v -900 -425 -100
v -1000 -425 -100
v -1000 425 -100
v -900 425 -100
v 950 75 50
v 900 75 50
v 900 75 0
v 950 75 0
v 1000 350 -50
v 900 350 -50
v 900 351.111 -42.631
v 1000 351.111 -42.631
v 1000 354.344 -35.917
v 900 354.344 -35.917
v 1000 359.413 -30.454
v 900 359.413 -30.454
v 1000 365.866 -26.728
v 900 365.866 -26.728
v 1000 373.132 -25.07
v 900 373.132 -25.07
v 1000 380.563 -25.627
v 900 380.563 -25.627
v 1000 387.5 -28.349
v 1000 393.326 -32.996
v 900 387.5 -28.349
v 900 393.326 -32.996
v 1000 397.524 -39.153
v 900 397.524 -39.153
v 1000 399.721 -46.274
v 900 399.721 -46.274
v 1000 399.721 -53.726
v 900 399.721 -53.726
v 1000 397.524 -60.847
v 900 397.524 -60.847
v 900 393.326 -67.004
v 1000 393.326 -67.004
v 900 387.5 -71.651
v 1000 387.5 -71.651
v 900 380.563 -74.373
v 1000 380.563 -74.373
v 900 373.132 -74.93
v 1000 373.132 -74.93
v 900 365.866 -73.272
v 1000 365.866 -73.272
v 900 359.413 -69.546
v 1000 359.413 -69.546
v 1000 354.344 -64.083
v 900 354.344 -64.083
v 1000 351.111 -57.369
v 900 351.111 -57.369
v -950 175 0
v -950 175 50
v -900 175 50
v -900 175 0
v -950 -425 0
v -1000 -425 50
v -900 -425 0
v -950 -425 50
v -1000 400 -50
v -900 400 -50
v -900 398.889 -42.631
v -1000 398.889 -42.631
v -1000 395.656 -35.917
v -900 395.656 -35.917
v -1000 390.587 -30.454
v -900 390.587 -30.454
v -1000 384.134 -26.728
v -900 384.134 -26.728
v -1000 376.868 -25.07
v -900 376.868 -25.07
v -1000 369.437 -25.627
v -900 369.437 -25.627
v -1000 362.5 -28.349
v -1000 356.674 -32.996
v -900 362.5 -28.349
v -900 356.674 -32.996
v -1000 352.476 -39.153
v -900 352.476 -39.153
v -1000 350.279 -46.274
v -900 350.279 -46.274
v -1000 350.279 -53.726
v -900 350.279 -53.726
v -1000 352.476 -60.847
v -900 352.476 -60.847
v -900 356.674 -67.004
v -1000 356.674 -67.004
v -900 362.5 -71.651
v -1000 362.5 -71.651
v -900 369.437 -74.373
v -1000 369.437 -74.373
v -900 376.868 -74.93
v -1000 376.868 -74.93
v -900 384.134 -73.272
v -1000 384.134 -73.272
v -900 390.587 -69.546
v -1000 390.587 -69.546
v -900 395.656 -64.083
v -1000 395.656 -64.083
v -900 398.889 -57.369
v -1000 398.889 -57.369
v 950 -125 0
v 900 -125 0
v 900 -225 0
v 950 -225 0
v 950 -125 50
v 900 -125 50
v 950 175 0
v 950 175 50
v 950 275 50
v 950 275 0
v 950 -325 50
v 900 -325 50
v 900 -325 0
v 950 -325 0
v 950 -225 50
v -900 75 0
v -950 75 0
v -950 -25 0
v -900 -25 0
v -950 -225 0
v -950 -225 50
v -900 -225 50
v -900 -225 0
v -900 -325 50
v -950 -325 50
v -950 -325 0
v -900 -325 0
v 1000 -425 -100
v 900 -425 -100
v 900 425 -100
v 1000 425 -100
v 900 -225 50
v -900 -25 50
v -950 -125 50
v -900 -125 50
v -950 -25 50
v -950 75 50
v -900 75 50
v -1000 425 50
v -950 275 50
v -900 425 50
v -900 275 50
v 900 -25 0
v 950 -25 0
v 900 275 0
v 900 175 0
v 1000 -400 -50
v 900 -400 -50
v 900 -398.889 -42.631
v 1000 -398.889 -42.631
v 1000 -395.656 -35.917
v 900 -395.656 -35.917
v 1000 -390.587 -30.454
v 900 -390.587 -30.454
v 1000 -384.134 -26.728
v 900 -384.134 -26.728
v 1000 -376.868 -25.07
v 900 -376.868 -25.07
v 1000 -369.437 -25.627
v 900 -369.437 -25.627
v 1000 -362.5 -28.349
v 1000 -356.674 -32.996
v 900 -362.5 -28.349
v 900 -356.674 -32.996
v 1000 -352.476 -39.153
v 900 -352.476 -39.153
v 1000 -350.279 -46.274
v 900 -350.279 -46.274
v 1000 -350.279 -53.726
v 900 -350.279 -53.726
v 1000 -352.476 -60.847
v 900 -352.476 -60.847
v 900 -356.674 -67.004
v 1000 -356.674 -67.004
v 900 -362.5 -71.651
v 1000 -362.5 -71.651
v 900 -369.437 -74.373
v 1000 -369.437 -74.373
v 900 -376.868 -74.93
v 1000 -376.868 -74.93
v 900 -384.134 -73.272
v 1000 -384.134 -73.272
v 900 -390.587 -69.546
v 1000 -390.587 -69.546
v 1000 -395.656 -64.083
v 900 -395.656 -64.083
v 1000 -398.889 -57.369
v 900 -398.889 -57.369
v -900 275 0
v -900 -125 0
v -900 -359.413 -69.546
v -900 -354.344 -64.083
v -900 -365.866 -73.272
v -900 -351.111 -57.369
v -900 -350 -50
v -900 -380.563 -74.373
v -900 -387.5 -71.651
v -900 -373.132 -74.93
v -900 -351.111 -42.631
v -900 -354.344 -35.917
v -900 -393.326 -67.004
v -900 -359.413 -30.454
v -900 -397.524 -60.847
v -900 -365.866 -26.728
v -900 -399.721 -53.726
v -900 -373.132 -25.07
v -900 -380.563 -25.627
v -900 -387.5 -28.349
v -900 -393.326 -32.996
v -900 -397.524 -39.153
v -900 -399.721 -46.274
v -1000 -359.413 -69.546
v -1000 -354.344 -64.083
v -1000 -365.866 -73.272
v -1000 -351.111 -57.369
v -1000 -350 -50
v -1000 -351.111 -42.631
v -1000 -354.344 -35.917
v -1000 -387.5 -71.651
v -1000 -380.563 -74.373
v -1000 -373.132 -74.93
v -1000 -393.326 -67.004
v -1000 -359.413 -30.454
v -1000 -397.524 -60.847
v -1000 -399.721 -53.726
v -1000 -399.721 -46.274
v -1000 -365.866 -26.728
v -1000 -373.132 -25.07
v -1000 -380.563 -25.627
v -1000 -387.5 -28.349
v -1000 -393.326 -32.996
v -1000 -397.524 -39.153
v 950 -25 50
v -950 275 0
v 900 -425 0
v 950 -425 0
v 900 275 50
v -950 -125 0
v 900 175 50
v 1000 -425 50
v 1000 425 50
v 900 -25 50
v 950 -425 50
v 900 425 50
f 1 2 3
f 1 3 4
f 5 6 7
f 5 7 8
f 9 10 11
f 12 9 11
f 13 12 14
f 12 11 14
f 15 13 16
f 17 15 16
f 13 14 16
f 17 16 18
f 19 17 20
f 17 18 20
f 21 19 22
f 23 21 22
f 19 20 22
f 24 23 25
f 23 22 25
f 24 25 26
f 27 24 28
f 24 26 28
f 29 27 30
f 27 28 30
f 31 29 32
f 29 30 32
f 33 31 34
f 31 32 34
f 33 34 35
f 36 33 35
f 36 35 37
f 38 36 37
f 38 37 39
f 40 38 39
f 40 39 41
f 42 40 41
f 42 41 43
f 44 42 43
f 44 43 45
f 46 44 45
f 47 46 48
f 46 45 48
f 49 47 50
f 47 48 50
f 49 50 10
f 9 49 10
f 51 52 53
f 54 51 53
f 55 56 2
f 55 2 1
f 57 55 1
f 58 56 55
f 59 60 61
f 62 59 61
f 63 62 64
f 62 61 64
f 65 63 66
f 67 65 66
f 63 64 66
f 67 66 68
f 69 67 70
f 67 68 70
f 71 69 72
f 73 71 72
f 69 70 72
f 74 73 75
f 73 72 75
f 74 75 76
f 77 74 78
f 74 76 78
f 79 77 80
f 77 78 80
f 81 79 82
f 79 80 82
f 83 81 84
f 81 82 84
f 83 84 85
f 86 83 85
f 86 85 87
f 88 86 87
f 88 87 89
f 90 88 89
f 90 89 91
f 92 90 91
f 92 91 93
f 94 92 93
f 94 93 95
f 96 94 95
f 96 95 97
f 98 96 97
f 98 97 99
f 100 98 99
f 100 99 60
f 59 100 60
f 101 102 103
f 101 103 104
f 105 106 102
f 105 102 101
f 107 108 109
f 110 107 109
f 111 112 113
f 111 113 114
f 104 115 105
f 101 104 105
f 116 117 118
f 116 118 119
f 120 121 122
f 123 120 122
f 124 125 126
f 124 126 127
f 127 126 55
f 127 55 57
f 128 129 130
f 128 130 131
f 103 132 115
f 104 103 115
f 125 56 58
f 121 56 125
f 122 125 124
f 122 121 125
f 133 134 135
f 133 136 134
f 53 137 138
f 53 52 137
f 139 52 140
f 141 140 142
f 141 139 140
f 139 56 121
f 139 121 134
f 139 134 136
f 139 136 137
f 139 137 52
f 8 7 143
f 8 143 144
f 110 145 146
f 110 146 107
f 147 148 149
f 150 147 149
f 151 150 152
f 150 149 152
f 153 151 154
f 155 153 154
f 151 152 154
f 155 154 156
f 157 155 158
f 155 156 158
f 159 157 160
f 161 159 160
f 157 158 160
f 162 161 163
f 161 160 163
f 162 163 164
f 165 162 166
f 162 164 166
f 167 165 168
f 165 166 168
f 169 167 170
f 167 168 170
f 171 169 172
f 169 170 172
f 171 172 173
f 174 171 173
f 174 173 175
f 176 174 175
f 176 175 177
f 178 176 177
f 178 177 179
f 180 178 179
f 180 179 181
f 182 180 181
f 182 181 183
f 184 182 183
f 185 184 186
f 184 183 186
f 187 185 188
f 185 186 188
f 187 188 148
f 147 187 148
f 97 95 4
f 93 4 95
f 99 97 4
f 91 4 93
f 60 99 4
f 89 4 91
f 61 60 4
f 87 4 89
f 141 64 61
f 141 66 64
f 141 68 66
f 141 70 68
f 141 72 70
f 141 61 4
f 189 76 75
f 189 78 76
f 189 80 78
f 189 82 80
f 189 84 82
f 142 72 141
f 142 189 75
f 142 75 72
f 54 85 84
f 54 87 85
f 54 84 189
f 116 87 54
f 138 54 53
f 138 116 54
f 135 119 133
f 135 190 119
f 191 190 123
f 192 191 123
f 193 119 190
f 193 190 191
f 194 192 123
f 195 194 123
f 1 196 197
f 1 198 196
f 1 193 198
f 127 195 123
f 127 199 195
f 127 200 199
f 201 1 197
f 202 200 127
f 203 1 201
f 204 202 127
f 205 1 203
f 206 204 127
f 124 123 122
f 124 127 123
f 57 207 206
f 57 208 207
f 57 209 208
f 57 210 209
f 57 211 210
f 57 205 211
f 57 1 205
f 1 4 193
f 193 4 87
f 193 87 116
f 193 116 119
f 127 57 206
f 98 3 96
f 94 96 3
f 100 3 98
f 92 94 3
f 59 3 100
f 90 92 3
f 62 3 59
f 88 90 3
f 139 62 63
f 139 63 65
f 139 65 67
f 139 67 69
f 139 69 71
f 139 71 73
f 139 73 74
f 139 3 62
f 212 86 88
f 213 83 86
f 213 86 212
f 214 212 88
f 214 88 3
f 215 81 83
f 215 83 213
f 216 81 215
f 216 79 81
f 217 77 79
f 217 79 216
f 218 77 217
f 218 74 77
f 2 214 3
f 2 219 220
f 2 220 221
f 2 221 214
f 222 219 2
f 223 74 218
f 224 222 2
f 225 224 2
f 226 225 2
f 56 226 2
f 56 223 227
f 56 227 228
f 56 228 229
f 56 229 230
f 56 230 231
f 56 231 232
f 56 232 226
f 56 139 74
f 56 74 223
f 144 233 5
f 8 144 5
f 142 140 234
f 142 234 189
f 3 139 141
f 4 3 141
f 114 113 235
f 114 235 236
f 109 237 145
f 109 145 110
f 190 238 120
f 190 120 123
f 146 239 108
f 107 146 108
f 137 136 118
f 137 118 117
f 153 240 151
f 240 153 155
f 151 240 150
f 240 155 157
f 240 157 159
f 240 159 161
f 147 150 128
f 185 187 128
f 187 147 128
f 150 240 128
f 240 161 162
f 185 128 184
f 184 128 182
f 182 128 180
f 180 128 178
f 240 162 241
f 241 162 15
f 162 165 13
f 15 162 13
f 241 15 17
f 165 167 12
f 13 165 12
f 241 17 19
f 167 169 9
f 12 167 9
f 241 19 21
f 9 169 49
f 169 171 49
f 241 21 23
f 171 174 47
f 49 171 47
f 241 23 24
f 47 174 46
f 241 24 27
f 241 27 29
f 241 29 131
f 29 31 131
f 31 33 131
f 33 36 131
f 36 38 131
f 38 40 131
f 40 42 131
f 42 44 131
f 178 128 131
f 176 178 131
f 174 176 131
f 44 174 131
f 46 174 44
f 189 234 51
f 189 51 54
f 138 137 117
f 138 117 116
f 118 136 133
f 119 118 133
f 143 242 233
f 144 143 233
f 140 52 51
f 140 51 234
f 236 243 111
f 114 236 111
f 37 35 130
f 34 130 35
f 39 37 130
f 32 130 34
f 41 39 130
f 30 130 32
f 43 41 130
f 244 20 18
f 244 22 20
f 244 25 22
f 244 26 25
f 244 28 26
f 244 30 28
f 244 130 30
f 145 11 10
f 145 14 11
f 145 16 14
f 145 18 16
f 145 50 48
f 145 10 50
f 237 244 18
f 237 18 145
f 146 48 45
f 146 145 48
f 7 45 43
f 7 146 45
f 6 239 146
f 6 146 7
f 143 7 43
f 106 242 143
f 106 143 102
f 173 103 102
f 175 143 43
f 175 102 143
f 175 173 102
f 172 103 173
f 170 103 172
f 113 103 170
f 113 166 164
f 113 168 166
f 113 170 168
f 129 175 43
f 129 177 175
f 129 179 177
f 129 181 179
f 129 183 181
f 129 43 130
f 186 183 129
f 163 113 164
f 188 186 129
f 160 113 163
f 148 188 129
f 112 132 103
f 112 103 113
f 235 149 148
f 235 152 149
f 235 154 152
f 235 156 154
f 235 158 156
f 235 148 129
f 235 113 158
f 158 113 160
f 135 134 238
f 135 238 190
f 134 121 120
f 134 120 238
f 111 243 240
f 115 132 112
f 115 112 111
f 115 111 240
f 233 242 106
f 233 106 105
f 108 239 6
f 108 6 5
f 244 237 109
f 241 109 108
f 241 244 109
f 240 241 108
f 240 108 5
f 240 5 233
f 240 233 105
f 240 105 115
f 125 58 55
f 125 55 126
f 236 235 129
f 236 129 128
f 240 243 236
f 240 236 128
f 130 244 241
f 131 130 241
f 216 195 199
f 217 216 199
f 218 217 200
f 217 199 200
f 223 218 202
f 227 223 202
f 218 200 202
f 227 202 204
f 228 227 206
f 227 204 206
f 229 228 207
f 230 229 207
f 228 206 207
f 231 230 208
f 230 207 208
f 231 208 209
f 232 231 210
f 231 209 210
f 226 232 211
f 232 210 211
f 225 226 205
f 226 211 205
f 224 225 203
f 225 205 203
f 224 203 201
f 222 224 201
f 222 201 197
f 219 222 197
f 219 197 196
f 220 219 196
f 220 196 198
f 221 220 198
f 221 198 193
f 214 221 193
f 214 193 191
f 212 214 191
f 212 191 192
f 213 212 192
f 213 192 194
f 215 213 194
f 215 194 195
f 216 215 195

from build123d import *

# Parameters (mm, degrees)
F0_W      = 2000
F0_H      = 850
F1_DEPTH  = 100
F2_W      = 100
F2_H      = 850
F3_DEPTH  = 100
F4_W      = 1600
F4_H      = 850
F5_DEPTH  = 120
F6_R      = 25
F7_DEPTH  = 150
F8_R      = 25
F9_DEPTH  = 100
F10_DEPTH = 50
F11_DEPTH = 50
F12_W     = 100
F12_H     = 50
F13_DEPTH = 1107
F14_W     = 100
F14_H     = 50
F15_DEPTH = 1000
F16_W     = 50
F16_H     = 100
F17_DEPTH = 50
F18_W     = 50
F18_H     = 100
F19_DEPTH = 50


with BuildPart() as f1:
    # F0 (on Top) → F1 (new body)
    with BuildSketch(Plane.XY):
        Rectangle(F0_W, F0_H)
    extrude(amount=F1_DEPTH)

    # F2 (on face) → F3 (join)
    with BuildSketch(Plane(origin=(0, 0, 0), x_dir=(1, 0, 0), z_dir=(0, 0, -1))):
        with Locations((-950, 0)):
            Rectangle(F2_W, F2_H)
        with Locations((950, 0)):
            Rectangle(F2_W, F2_H)
    extrude(amount=F3_DEPTH)

    # F4 (on face) → F5 (cut)
    with BuildSketch(Plane.XY.offset(100)):
        Rectangle(F4_W, F4_H)
    extrude(amount=-F5_DEPTH, mode=Mode.SUBTRACT)

    # F6 (on face) → F7 (cut)
    with BuildSketch(Plane.YZ.offset(-900)):
        with Locations((-375, -50)):
            Circle(F6_R)
        with Locations((375, -50)):
            Circle(F6_R)
    extrude(amount=-F7_DEPTH, mode=Mode.SUBTRACT)

    # F8 (on face) → F9 (cut)
    with BuildSketch(Plane(origin=(900, 0, 0), x_dir=(0, -1, 0), z_dir=(-1, 0, 0))):
        with Locations((375, -50)):
            Circle(F8_R)
        with Locations((-375, -50)):
            Circle(F8_R)
    extrude(amount=-F9_DEPTH, mode=Mode.SUBTRACT)

    # F10 (cut): a face of the model
    f10_faces = [f1.faces().sort_by_distance(p)[0] for p in [
        (-900, 0, 100),
    ]]
    extrude(f10_faces, amount=-F10_DEPTH, mode=Mode.SUBTRACT)

    # F11 (cut): a face of the model
    f11_faces = [f1.faces().sort_by_distance(p)[0] for p in [
        (900, 0, 100),
    ]]
    extrude(f11_faces, amount=-F11_DEPTH, mode=Mode.SUBTRACT)

    # F12 (on face) → F13 (cut)
    with BuildSketch(Plane.XZ.offset(425)):
        with Locations((850, 25)):
            Rectangle(F12_W, F12_H)
    extrude(amount=-F13_DEPTH, mode=Mode.SUBTRACT)

    # F14 (on face) → F15 (cut)
    with BuildSketch(Plane.XZ.offset(425)):
        with Locations((-850, 25)):
            Rectangle(F14_W, F14_H)
    extrude(amount=-F15_DEPTH, mode=Mode.SUBTRACT)

    # F16 (on face) → F17 (cut)
    with BuildSketch(Plane.XY.offset(50)):
        with Locations((-925, -375)):
            Rectangle(F16_W, F16_H)
        with Locations((-925, -175)):
            Rectangle(F16_W, F16_H)
        with Locations((-925, 25)):
            Rectangle(F16_W, F16_H)
        with Locations((-925, 225)):
            Rectangle(F16_W, F16_H)
    extrude(amount=-F17_DEPTH, mode=Mode.SUBTRACT)

    # F18 (on face) → F19 (cut)
    with BuildSketch(Plane.XY.offset(50)):
        with Locations((925, -375)):
            Rectangle(F18_W, F18_H)
        with Locations((925, -175)):
            Rectangle(F18_W, F18_H)
        with Locations((925, 25)):
            Rectangle(F18_W, F18_H)
        with Locations((925, 225)):
            Rectangle(F18_W, F18_H)
    extrude(amount=-F19_DEPTH, mode=Mode.SUBTRACT)


solid = f1.part
